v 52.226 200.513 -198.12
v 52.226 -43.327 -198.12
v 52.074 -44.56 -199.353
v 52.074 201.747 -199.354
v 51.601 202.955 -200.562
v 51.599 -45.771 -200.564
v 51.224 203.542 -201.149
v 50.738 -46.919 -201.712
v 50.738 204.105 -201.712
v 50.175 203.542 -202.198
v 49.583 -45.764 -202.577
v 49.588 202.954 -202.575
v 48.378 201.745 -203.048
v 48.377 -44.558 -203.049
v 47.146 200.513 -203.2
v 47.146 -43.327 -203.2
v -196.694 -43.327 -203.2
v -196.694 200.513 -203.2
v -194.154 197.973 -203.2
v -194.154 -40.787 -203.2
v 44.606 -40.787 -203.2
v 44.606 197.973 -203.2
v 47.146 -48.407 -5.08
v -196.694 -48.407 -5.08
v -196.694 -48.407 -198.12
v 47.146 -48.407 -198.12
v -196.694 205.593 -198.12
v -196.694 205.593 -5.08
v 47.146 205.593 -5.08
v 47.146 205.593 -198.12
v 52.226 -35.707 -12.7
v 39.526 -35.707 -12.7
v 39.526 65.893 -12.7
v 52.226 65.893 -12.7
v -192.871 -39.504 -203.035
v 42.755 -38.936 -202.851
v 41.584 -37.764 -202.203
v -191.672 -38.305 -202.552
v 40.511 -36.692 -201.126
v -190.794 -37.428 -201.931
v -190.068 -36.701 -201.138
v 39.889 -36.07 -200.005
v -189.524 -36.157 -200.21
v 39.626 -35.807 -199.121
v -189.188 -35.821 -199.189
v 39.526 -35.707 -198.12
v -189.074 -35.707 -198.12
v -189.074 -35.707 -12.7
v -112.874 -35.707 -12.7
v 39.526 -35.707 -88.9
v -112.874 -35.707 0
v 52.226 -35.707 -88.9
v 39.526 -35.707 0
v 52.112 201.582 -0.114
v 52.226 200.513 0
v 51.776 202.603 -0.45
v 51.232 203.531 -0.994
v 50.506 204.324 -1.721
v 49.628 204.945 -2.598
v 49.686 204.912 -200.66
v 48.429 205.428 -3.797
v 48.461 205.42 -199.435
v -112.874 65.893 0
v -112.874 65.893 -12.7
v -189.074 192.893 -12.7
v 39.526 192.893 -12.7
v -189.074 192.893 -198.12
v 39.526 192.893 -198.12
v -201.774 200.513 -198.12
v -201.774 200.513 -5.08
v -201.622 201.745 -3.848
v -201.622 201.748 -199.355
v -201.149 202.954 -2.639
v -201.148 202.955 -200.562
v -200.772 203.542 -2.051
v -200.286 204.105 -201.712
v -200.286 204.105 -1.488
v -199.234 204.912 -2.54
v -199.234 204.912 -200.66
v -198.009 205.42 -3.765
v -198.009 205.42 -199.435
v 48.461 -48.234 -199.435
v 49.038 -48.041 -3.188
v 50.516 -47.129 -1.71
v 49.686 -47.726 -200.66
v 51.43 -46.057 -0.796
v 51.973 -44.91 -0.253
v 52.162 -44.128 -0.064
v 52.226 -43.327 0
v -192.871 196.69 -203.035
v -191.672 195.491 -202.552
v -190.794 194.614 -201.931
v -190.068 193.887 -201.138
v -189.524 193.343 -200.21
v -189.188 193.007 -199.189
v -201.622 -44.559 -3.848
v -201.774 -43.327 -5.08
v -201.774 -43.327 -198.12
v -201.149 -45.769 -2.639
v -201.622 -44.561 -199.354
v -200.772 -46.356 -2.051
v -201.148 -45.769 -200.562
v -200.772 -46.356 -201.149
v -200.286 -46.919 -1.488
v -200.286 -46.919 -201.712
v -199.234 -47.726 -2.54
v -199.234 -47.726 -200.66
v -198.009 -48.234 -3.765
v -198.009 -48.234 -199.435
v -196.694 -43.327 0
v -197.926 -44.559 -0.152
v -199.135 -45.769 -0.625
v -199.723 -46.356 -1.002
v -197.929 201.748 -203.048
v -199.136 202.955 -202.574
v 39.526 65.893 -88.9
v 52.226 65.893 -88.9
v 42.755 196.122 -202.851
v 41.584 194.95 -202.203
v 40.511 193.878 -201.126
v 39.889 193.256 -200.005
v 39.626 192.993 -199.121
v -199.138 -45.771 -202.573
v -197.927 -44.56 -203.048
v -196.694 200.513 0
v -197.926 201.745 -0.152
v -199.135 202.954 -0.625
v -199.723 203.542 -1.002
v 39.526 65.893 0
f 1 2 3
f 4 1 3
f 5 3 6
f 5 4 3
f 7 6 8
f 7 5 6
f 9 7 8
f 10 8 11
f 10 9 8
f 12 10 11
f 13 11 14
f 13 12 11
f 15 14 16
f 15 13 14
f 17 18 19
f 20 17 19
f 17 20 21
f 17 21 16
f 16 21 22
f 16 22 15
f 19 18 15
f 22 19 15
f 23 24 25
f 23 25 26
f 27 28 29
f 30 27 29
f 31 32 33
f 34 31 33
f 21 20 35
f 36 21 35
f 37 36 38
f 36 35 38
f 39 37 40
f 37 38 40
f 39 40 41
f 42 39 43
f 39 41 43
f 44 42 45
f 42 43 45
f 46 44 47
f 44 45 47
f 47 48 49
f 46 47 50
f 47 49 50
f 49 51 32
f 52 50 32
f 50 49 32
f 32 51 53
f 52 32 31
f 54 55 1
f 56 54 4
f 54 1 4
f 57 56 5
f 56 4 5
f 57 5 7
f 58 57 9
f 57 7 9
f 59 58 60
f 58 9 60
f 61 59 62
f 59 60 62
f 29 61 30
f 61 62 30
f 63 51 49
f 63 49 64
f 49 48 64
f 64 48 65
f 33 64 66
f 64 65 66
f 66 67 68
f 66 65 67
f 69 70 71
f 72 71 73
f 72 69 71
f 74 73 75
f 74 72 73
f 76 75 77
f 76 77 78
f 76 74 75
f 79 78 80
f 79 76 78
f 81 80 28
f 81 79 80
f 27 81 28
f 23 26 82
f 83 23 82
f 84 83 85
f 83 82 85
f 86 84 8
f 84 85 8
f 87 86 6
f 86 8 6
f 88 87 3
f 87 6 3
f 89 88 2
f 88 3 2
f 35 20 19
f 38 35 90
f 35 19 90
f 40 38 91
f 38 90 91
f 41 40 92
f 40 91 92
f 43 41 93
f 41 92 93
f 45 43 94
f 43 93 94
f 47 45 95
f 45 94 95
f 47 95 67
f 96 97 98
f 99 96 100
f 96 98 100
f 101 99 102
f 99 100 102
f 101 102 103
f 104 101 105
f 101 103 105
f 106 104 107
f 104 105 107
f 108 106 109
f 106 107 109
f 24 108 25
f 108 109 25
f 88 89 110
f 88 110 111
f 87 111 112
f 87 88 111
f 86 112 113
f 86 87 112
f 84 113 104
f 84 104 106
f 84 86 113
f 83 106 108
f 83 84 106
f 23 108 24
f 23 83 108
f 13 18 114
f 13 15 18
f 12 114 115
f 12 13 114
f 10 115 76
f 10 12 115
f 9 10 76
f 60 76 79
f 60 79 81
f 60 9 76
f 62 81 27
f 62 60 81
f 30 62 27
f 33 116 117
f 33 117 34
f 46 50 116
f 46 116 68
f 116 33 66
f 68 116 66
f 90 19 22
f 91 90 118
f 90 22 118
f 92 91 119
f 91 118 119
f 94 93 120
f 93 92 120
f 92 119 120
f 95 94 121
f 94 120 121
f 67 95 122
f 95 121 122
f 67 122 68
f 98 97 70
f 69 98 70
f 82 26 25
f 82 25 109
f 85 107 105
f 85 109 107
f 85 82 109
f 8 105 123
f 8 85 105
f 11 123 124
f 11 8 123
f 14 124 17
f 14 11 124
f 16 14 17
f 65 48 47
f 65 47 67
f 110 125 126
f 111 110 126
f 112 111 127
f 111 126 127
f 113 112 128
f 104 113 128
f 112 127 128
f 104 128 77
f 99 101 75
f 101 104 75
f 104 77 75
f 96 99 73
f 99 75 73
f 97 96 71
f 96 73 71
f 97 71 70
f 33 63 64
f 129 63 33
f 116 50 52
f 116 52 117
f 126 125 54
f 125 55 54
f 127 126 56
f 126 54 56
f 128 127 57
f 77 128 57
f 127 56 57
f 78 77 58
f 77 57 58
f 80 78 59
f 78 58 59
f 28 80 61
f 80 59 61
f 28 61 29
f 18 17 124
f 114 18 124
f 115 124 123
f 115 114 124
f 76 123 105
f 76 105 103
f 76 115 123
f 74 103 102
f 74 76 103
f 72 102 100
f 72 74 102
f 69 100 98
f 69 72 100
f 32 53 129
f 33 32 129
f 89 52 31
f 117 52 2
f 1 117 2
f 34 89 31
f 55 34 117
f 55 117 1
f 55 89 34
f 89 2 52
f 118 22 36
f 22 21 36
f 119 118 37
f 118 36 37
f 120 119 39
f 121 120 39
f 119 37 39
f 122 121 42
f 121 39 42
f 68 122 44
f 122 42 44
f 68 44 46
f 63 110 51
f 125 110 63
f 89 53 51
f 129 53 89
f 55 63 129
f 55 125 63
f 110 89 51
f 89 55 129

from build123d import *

# Parameters (mm, degrees)
F0_W          = 254
F0_H          = 254
F0_W_2        = 228.6
F0_H_2        = 228.6
F1_DEPTH      = 203.2
F2_T          = -12.7
F3_W          = 152.4
F3_H          = 101.6
F4_DEPTH      = 12.7
F5_W          = 101.6
F5_H          = 76.2
F6_DEPTH      = 76.2
F7_R          = 5.08
F8_R          = 5.08
F9_T1_DEPTH   = 269.24
F10_T1_DEPTH  = 269.24
F10_T3_DEPTH  = 228.6
F10_T5_DEPTH  = 228.6
F10_T11_DEPTH = 241.3
F10_T15_DEPTH = 241.3
F10_T22_DEPTH = 241.3
F10_T26_DEPTH = 241.3
F10_T33_DEPTH = 241.3
F10_T37_DEPTH = 241.3
F10_T44_DEPTH = 241.3
F10_T48_DEPTH = 241.3


# Not quite as in the source:
# - a fillet or chamfer that OpenCascade refuses, or shapes differently, is made with other operations: its cross-section is extruded or revolved along the edge and cut away or added


with BuildPart() as f1:
    # F0 (on Top) → F1 (new body)
    with BuildSketch(Plane.XY):
        with Locations((-74.773899883, 78.5929929912)):
            Rectangle(F0_W, F0_H)
        with Locations((-74.773899883, 78.5929929912)):
            Rectangle(F0_W_2, F0_H_2, mode=Mode.SUBTRACT)
        with Locations((-74.773899883, 78.5929929912)):
            Rectangle(F0_W_2, F0_H_2)
    extrude(amount=-F1_DEPTH)

    # F2
    f2_openings = [f1.faces().sort_by_distance(p)[0] for p in [
        (-74.7739, 78.592993, -203.2),
    ]]
    offset(amount=F2_T, openings=f2_openings)

    # F3 (on Top) → F4 (cut)
    with BuildSketch(Plane.XY):
        with Locations((-36.673899883, 15.0929929912)):
            Rectangle(F3_W, F3_H)
    extrude(amount=-F4_DEPTH, mode=Mode.SUBTRACT)

    # F5 (on Right) → F6 (cut)
    with BuildSketch(Plane.YZ):
        with Locations((15.0929929912, -50.8)):
            Rectangle(F5_W, F5_H)
    extrude(amount=F6_DEPTH, mode=Mode.SUBTRACT)

    # F7
    f7_edges = [f1.edges().sort_by_distance(p)[0] for p in [
        (52.2261, 205.592993, -101.6),
        (-201.7739, 205.592993, -101.6),
        (-74.7739, 205.592993, 0),
        (-74.7739, 205.592993, -203.2),
    ]]
    fillet(f7_edges, radius=F7_R)

    # F8
    f8_edges = [f1.edges().sort_by_distance(p)[0] for p in [
        (-201.7739, -48.407007, -101.6),
        (52.2261, -48.407007, -101.6),
        (-74.7739, -48.407007, 0),
        (-74.7739, -48.407007, -203.2),
    ]]
    fillet(f8_edges, radius=F8_R)

    # F9: fillet of radius 5.08 on 4 edges, made by hand

    # F9_s2 → F9_t1 (cut)
    with BuildSketch(Plane.XZ.offset(-213.2129929912)):
        with BuildLine():
            ThreePointArc((-196.693899883, 0), (-200.2860023315, -1.4878975516), (-201.773899883, -5.08))
            Line((-201.773899883, -5.08), (-201.773899883, 0))
            Line((-201.773899883, 0), (-196.693899883, 0))
        make_face()
        with BuildLine():
            ThreePointArc((-196.693899883, -203.2), (-200.2860023315, -201.7121024484), (-201.773899883, -198.12))
            Line((-201.773899883, -198.12), (-201.773899883, -203.2))
            Line((-201.773899883, -203.2), (-196.693899883, -203.2))
        make_face()
    extrude(amount=F9_T1_DEPTH, mode=Mode.SUBTRACT)

    # F10: fillet of radius 5.08 on 8 edges, made by hand

    # F10_s2 → F10_t1 (cut)
    with BuildSketch(Plane.XZ.offset(-213.2129929912)):
        with BuildLine():
            ThreePointArc((52.226100117, -198.12), (50.7382025654, -201.7121024484), (47.146100117, -203.2))
            Line((47.146100117, -203.2), (52.226100117, -203.2))
            Line((52.226100117, -203.2), (52.226100117, -198.12))
        make_face()
    extrude(amount=F10_T1_DEPTH, mode=Mode.SUBTRACT)

    # F10_s4 → F10_t3 (cut)
    with BuildSketch(Plane.XZ.offset(-192.8929929912)):
        with BuildLine():
            ThreePointArc((44.606100117, -203.2), (41.0139976685, -201.7121024484), (39.526100117, -198.12))
            Line((39.526100117, -198.12), (39.526100117, -203.2))
            Line((39.526100117, -203.2), (44.606100117, -203.2))
        make_face()
        with BuildLine():
            ThreePointArc((-194.153899883, -203.2), (-190.5617974346, -201.7121024484), (-189.073899883, -198.12))
            Line((-189.073899883, -198.12), (-189.073899883, -203.2))
            Line((-189.073899883, -203.2), (-194.153899883, -203.2))
        make_face()
    extrude(amount=F10_T3_DEPTH, mode=Mode.SUBTRACT)

    # F10_s6 → F10_t5 (cut)
    with BuildSketch(Plane.YZ.offset(-189.073899883)):
        with BuildLine():
            ThreePointArc((-40.7870070088, -203.2), (-37.1949045604, -201.7121024484), (-35.7070070088, -198.12))
            Line((-35.7070070088, -198.12), (-35.7070070088, -203.2))
            Line((-35.7070070088, -203.2), (-40.7870070088, -203.2))
        make_face()
        with BuildLine():
            ThreePointArc((197.9729929912, -203.2), (194.3808905428, -201.7121024484), (192.8929929912, -198.12))
            Line((192.8929929912, -198.12), (192.8929929912, -203.2))
            Line((192.8929929912, -203.2), (197.9729929912, -203.2))
        make_face()
    extrude(amount=F10_T5_DEPTH, mode=Mode.SUBTRACT)


with BuildPart() as f10_tool9:
    # F10_s10 → F10_t11 (new body)
    with BuildSketch(Plane.XZ.offset(48.4070070088)):
        with BuildLine():
            ThreePointArc((44.606100117, -203.2), (41.0139976685, -201.7121024484), (39.526100117, -198.12))
            Line((39.526100117, -198.12), (39.526100117, -203.2))
            Line((39.526100117, -203.2), (44.606100117, -203.2))
        make_face()
    extrude(amount=-F10_T11_DEPTH)

    split(bisect_by=Plane.XZ.offset(35.7070070088), keep=Keep.TOP)


with BuildPart() as f10_tool13:
    # F10_s14 → F10_t15 (new body)
    with BuildSketch(Plane.YZ.offset(-189.073899883)):
        with BuildLine():
            ThreePointArc((-40.7870070088, -203.2), (-37.1949045604, -201.7121024484), (-35.7070070088, -198.12))
            Line((-35.7070070088, -198.12), (-35.7070070088, -203.2))
            Line((-35.7070070088, -203.2), (-40.7870070088, -203.2))
        make_face()
    extrude(amount=F10_T15_DEPTH)

    split(bisect_by=Plane.YZ.offset(39.526100117), keep=Keep.TOP)


with BuildPart() as f10_tool9_1:
    add(f10_tool9.part)

    # F10_t17: intersect F10_tool13
    add(f10_tool13.part, mode=Mode.INTERSECT)


with BuildPart() as f1_1:
    add(f1.part)

    # F10_t7: cut F10_tool9
    add(f10_tool9_1.part, mode=Mode.SUBTRACT)


with BuildPart() as f10_tool20:
    # F10_s21 → F10_t22 (new body)
    with BuildSketch(Plane.XZ.offset(35.7070070088)):
        with BuildLine():
            ThreePointArc((44.606100117, -203.2), (41.0139976685, -201.7121024484), (39.526100117, -198.12))
            Line((39.526100117, -198.12), (39.526100117, -203.2))
            Line((39.526100117, -203.2), (44.606100117, -203.2))
        make_face()
    extrude(amount=-F10_T22_DEPTH)

    split(bisect_by=Plane.XZ.offset(-192.8929929912), keep=Keep.BOTTOM)


with BuildPart() as f10_tool24:
    # F10_s25 → F10_t26 (new body)
    with BuildSketch(Plane.YZ.offset(52.226100117)):
        with BuildLine():
            ThreePointArc((197.9729929912, -203.2), (194.3808905428, -201.7121024484), (192.8929929912, -198.12))
            Line((192.8929929912, -198.12), (192.8929929912, -203.2))
            Line((192.8929929912, -203.2), (197.9729929912, -203.2))
        make_face()
    extrude(amount=-F10_T26_DEPTH)

    split(bisect_by=Plane.YZ.offset(39.526100117), keep=Keep.TOP)


with BuildPart() as f10_tool20_1:
    add(f10_tool20.part)

    # F10_t28: intersect F10_tool24
    add(f10_tool24.part, mode=Mode.INTERSECT)


with BuildPart() as f1_2:
    add(f1_1.part)

    # F10_t18: cut F10_tool20
    add(f10_tool20_1.part, mode=Mode.SUBTRACT)


with BuildPart() as f10_tool31:
    # F10_s32 → F10_t33 (new body)
    with BuildSketch(Plane.YZ.offset(-201.773899883)):
        with BuildLine():
            ThreePointArc((-40.7870070088, -203.2), (-37.1949045604, -201.7121024484), (-35.7070070088, -198.12))
            Line((-35.7070070088, -198.12), (-35.7070070088, -203.2))
            Line((-35.7070070088, -203.2), (-40.7870070088, -203.2))
        make_face()
    extrude(amount=F10_T33_DEPTH)

    split(bisect_by=Plane.YZ.offset(-189.073899883), keep=Keep.BOTTOM)


with BuildPart() as f10_tool35:
    # F10_s36 → F10_t37 (new body)
    with BuildSketch(Plane.XZ.offset(-192.8929929912)):
        with BuildLine():
            ThreePointArc((-194.153899883, -203.2), (-190.5617974346, -201.7121024484), (-189.073899883, -198.12))
            Line((-189.073899883, -198.12), (-189.073899883, -203.2))
            Line((-189.073899883, -203.2), (-194.153899883, -203.2))
        make_face()
    extrude(amount=F10_T37_DEPTH)

    split(bisect_by=Plane.XZ.offset(35.7070070088), keep=Keep.TOP)


with BuildPart() as f10_tool31_1:
    add(f10_tool31.part)

    # F10_t39: intersect F10_tool35
    add(f10_tool35.part, mode=Mode.INTERSECT)


with BuildPart() as f1_3:
    add(f1_2.part)

    # F10_t29: cut F10_tool31
    add(f10_tool31_1.part, mode=Mode.SUBTRACT)


with BuildPart() as f10_tool42:
    # F10_s43 → F10_t44 (new body)
    with BuildSketch(Plane.YZ.offset(39.526100117)):
        with BuildLine():
            ThreePointArc((197.9729929912, -203.2), (194.3808905428, -201.7121024484), (192.8929929912, -198.12))
            Line((192.8929929912, -198.12), (192.8929929912, -203.2))
            Line((192.8929929912, -203.2), (197.9729929912, -203.2))
        make_face()
    extrude(amount=-F10_T44_DEPTH)

    split(bisect_by=Plane.YZ.offset(-189.073899883), keep=Keep.BOTTOM)


with BuildPart() as f10_tool46:
    # F10_s47 → F10_t48 (new body)
    with BuildSketch(Plane.XZ.offset(-205.5929929912)):
        with BuildLine():
            ThreePointArc((-194.153899883, -203.2), (-190.5617974346, -201.7121024484), (-189.073899883, -198.12))
            Line((-189.073899883, -198.12), (-189.073899883, -203.2))
            Line((-189.073899883, -203.2), (-194.153899883, -203.2))
        make_face()
    extrude(amount=F10_T48_DEPTH)

    split(bisect_by=Plane.XZ.offset(-192.8929929912), keep=Keep.BOTTOM)


with BuildPart() as f10_tool42_1:
    add(f10_tool42.part)

    # F10_t50: intersect F10_tool46
    add(f10_tool46.part, mode=Mode.INTERSECT)


with BuildPart() as f1_4:
    add(f1_3.part)

    # F10_t40: cut F10_tool42
    add(f10_tool42_1.part, mode=Mode.SUBTRACT)


solid = f1_4.part
